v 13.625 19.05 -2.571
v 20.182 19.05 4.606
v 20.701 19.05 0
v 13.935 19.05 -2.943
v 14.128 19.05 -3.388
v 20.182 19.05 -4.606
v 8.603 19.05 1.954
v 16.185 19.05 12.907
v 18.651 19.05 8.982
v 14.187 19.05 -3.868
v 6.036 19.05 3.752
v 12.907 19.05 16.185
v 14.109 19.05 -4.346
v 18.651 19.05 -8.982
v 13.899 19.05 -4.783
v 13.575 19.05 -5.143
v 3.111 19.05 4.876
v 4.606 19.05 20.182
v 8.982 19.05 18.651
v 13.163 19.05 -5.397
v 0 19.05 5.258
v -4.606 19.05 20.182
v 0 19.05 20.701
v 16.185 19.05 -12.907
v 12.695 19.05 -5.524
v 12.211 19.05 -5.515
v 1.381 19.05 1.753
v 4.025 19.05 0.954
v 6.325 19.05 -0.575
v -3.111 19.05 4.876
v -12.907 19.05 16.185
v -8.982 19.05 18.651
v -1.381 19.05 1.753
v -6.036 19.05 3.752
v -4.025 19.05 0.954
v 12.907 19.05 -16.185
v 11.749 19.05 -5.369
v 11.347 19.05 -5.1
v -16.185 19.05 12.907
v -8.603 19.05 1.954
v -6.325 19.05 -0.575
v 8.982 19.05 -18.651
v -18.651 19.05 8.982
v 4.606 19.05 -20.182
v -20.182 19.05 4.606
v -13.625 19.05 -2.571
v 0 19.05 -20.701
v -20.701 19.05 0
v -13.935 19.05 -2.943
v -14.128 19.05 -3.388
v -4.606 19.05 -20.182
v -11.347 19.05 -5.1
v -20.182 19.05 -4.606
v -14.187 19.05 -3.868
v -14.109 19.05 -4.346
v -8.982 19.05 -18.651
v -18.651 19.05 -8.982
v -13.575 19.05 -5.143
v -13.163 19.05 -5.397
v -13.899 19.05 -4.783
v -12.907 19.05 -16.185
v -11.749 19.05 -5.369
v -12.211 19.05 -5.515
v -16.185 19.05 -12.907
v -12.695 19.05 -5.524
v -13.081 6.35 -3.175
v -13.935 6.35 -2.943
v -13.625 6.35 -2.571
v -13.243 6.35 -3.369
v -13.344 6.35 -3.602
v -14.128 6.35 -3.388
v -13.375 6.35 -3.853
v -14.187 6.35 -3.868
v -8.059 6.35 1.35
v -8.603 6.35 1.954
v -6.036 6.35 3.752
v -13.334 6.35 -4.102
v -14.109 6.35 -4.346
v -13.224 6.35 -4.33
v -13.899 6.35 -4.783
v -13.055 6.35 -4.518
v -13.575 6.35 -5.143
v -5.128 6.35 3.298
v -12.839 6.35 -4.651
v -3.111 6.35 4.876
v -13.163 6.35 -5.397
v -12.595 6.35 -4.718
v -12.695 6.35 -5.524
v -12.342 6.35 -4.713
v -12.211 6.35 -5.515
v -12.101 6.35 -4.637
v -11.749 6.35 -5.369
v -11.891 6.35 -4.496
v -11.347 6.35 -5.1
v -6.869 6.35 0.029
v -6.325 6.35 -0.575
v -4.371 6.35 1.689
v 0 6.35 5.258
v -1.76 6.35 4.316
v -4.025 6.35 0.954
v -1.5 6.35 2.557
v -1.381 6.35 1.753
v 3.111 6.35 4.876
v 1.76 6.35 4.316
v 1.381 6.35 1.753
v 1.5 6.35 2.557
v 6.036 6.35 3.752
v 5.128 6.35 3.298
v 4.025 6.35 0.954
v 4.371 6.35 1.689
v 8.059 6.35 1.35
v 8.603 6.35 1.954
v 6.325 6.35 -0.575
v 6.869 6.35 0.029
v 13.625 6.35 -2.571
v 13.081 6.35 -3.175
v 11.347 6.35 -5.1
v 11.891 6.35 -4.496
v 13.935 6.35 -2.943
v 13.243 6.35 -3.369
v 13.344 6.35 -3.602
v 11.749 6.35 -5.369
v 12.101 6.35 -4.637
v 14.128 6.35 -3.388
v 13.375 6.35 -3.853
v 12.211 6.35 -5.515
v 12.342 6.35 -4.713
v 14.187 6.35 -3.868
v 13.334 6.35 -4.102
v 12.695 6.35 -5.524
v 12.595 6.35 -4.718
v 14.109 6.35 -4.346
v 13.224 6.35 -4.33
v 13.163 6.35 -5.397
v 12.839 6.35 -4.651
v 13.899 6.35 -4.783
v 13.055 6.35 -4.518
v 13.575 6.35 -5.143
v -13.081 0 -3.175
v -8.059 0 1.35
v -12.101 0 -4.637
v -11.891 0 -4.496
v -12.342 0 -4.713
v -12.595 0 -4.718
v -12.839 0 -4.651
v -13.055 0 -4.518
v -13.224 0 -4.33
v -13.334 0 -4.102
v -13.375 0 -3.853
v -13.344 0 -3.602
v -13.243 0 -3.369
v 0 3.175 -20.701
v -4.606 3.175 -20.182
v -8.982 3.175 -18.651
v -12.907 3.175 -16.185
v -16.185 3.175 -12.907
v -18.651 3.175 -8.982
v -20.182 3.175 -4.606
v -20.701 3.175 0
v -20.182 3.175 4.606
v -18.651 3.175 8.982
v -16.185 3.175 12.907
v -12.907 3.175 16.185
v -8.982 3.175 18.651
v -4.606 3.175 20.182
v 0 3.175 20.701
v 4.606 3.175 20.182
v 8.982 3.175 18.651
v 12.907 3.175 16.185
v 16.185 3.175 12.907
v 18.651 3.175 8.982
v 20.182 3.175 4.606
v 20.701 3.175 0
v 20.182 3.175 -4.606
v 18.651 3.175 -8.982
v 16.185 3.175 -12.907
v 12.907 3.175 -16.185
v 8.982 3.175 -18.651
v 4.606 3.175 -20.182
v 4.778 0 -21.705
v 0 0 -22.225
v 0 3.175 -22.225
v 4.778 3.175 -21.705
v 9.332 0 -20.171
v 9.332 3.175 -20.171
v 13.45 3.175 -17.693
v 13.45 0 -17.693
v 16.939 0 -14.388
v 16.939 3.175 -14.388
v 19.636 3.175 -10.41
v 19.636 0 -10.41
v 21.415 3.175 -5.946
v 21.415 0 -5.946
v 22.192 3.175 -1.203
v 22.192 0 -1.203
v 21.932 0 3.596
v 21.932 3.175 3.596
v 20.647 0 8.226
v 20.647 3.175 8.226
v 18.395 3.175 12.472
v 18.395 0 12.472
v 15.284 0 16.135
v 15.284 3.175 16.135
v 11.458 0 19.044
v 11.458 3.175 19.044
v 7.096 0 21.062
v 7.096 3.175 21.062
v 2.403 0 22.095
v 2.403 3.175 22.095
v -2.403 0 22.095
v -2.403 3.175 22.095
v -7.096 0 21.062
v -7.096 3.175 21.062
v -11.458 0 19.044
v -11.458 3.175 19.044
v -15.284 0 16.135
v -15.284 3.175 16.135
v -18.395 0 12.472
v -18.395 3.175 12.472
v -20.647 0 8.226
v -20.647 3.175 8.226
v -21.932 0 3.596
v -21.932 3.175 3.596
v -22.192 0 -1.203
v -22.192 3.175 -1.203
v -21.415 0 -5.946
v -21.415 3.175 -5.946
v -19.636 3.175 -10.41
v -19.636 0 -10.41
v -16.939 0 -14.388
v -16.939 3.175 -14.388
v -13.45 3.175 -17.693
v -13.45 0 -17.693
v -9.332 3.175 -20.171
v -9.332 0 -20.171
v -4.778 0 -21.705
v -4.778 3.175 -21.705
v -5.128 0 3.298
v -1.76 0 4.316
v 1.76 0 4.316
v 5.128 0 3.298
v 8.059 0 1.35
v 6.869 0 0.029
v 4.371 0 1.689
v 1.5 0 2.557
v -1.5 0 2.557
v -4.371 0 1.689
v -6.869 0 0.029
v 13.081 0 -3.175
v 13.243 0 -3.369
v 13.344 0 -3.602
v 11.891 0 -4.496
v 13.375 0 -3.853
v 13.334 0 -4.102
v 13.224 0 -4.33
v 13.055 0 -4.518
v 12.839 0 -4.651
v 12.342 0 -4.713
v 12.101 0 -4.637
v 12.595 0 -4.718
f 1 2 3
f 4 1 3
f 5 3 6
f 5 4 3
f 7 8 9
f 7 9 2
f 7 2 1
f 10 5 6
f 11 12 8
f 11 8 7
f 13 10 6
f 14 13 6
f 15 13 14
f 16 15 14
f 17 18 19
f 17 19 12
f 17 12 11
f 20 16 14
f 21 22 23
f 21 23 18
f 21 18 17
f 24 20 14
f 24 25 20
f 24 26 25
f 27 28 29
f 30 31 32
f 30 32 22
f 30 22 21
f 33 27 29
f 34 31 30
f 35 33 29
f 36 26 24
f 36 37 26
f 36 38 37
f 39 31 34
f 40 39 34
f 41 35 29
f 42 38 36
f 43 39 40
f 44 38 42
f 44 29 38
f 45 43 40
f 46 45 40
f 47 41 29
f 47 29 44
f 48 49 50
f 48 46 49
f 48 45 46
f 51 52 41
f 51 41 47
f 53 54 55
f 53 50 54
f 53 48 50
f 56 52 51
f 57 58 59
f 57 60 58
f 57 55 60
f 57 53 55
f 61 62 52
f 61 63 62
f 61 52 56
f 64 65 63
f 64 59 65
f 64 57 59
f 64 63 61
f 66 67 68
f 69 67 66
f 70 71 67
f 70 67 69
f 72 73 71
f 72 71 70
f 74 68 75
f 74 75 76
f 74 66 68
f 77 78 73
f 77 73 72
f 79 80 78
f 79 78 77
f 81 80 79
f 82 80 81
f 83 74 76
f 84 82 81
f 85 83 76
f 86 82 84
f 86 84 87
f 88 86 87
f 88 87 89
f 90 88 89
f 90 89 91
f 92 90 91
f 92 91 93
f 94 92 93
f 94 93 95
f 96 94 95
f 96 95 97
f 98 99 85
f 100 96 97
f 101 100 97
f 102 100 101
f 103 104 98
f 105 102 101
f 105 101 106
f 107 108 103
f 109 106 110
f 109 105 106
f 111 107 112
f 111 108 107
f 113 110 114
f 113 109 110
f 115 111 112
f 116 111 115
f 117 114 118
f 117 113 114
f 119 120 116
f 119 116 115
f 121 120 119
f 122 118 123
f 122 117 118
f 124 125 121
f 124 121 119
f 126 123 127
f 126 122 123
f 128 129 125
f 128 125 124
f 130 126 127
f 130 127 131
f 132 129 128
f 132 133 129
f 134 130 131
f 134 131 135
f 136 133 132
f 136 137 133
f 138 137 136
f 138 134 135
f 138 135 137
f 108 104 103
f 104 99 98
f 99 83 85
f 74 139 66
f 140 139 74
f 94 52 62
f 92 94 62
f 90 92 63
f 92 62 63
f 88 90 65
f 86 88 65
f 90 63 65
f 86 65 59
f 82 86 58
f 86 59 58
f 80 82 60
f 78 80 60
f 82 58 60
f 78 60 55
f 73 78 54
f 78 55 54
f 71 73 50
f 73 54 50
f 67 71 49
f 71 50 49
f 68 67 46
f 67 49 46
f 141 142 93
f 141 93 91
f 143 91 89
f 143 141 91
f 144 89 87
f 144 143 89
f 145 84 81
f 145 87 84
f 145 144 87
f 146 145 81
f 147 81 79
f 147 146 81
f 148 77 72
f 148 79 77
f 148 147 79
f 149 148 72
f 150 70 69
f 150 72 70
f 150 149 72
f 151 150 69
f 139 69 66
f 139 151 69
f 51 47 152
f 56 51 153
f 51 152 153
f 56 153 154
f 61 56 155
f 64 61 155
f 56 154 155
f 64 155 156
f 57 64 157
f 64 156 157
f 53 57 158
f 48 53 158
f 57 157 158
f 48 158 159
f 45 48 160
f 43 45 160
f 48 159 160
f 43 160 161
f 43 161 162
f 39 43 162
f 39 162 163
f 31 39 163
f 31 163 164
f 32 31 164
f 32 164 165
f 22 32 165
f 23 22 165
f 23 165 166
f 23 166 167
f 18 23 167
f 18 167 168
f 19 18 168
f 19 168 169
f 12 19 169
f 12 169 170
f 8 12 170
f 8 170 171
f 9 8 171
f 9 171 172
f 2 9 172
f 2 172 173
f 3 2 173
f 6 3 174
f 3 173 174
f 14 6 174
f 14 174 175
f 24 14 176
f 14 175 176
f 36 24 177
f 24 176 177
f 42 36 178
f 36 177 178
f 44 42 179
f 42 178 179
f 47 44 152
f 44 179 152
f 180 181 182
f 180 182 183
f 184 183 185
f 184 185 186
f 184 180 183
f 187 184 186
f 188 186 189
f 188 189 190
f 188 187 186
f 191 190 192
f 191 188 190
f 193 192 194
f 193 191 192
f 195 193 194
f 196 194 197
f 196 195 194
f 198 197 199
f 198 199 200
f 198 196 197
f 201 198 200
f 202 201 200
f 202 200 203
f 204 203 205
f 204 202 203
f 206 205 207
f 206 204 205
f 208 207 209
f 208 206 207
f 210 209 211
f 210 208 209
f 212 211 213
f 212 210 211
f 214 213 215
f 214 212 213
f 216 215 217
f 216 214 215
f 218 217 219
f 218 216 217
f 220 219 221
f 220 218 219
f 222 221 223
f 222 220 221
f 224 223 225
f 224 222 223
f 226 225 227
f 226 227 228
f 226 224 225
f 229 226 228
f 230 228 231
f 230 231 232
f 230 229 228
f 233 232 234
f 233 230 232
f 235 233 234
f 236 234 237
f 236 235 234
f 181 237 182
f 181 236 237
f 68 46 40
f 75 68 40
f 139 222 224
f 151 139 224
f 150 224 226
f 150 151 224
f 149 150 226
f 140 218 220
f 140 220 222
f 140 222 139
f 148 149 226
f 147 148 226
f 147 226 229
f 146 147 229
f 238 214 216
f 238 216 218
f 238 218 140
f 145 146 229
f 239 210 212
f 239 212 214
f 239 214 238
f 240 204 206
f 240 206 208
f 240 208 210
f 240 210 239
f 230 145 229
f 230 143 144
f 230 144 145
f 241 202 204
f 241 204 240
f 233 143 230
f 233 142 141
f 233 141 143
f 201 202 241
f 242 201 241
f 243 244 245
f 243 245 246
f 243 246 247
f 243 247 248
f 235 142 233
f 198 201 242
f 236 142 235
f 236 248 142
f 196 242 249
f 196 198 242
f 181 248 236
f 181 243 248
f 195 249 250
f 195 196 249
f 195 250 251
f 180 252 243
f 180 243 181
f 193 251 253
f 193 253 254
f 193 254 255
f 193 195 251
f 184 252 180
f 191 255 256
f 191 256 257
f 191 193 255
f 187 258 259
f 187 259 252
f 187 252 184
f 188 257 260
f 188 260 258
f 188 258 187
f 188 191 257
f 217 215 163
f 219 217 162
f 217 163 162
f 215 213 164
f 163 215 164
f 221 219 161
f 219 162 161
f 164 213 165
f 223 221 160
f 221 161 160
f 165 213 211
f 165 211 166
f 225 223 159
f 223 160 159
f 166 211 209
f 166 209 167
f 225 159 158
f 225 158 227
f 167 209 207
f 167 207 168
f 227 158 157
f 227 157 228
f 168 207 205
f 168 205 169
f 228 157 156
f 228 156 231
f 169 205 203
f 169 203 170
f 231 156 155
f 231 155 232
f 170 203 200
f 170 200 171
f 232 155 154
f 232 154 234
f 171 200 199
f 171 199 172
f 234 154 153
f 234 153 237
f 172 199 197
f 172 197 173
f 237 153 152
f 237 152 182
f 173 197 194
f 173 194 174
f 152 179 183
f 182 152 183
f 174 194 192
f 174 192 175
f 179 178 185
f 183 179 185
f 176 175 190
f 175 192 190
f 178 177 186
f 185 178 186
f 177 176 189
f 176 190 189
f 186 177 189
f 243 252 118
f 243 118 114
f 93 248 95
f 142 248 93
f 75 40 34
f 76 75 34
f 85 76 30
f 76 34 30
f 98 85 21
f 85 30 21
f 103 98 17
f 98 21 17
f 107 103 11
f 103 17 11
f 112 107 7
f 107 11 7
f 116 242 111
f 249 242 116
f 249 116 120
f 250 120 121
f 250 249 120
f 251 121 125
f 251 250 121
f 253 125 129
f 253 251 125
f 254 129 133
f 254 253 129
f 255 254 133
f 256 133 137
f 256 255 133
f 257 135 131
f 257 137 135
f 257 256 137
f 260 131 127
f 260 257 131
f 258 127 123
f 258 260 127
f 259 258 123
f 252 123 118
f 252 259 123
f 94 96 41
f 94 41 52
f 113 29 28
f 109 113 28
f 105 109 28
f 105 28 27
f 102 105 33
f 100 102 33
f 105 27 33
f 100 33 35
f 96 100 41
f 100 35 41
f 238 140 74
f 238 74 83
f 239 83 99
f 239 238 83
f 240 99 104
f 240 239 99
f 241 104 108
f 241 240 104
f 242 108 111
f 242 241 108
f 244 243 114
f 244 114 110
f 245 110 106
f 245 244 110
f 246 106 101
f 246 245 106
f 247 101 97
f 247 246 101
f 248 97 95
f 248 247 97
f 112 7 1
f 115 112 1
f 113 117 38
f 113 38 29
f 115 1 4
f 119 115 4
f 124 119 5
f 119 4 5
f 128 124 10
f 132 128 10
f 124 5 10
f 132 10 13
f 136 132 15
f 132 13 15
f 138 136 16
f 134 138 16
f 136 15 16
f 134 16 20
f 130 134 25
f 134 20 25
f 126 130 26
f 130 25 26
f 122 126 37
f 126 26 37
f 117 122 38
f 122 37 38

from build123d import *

# Parameters (mm, degrees)
SKETCH2_R           = 20.701
BOSS_EXTRUDE1_DEPTH = 19.05
CUT_EXTRUDE2_DEPTH  = 12.7
SKETCH15_R          = 22.225
BOSS_EXTRUDE2_DEPTH = 3.175


with BuildPart() as part:
    # Sketch2 → Boss-Extrude1 (new body)
    with BuildSketch(Plane(origin=(0, 0, 0), x_dir=(1, 0, 0), z_dir=(0, 1, 0))):
        with Locations(Location((0, 0, 0), (0, 0, 90))):
            Circle(SKETCH2_R)
        with BuildLine():
            Line((-13.081, 3.175), (-8.059107313, -1.349826056))
            ThreePointArc((-8.059107313, -1.349826056), (0, -4.445), (8.059107313, -1.349826056))
            Line((8.059107313, -1.349826056), (13.081, 3.175))
            ThreePointArc((13.081, 3.175), (13.146371637, 4.430535164), (11.890836473, 4.495906802))
            Line((11.890836473, 4.495906802), (6.868943786, -0.028919255))
            ThreePointArc((6.868943786, -0.028919255), (0, -2.667), (-6.868943786, -0.028919255))
            Line((-6.868943786, -0.028919255), (-11.890836473, 4.495906802))
            ThreePointArc((-11.890836473, 4.495906802), (-13.146371637, 4.430535164), (-13.081, 3.175))
        make_face(mode=Mode.SUBTRACT)
    extrude(amount=BOSS_EXTRUDE1_DEPTH)

    # Sketch14 → Cut-Extrude2 (cut)
    with BuildSketch(Plane(origin=(0, 19.05, 0), x_dir=(1, 0, 0), z_dir=(0, 1, 0))):
        with BuildLine():
            Line((8.603182068, -1.953669166), (13.625074755, 2.571156891))
            ThreePointArc((13.625074755, 2.571156891), (13.750214746, 4.97460992), (11.346761717, 5.099749911))
            Line((11.346761717, 5.099749911), (6.32486903, 0.574923855))
            ThreePointArc((6.32486903, 0.574923855), (0, -1.8542), (-6.32486903, 0.574923855))
            Line((-6.32486903, 0.574923855), (-11.346761717, 5.099749911))
            ThreePointArc((-11.346761717, 5.099749911), (-13.750214746, 4.97460992), (-13.625074755, 2.571156891))
            Line((-13.625074755, 2.571156891), (-8.603182068, -1.953669166))
            ThreePointArc((-8.603182068, -1.953669166), (0, -5.2578), (8.603182068, -1.953669166))
        make_face()
    extrude(amount=-CUT_EXTRUDE2_DEPTH, mode=Mode.SUBTRACT)

    # Sketch15 → Boss-Extrude2 (add)
    with BuildSketch(Plane.XZ):
        with Locations(Location((0, 0, 0), (0, 0, 270))):
            Circle(SKETCH15_R)
        with BuildLine():
            Line((-13.081, -3.175), (-8.059107313, 1.349826056))
            ThreePointArc((-8.059107313, 1.349826056), (0, 4.445), (8.059107313, 1.349826056))
            Line((8.059107313, 1.349826056), (13.081, -3.175))
            ThreePointArc((13.081, -3.175), (13.146371637, -4.430535164), (11.890836473, -4.495906802))
            Line((11.890836473, -4.495906802), (6.868943786, 0.028919255))
            ThreePointArc((6.868943786, 0.028919255), (0, 2.667), (-6.868943786, 0.028919255))
            Line((-6.868943786, 0.028919255), (-11.890836473, -4.495906802))
            ThreePointArc((-11.890836473, -4.495906802), (-13.146371637, -4.430535164), (-13.081, -3.175))
        make_face(mode=Mode.SUBTRACT)
    extrude(amount=-BOSS_EXTRUDE2_DEPTH)


solid = part.part
